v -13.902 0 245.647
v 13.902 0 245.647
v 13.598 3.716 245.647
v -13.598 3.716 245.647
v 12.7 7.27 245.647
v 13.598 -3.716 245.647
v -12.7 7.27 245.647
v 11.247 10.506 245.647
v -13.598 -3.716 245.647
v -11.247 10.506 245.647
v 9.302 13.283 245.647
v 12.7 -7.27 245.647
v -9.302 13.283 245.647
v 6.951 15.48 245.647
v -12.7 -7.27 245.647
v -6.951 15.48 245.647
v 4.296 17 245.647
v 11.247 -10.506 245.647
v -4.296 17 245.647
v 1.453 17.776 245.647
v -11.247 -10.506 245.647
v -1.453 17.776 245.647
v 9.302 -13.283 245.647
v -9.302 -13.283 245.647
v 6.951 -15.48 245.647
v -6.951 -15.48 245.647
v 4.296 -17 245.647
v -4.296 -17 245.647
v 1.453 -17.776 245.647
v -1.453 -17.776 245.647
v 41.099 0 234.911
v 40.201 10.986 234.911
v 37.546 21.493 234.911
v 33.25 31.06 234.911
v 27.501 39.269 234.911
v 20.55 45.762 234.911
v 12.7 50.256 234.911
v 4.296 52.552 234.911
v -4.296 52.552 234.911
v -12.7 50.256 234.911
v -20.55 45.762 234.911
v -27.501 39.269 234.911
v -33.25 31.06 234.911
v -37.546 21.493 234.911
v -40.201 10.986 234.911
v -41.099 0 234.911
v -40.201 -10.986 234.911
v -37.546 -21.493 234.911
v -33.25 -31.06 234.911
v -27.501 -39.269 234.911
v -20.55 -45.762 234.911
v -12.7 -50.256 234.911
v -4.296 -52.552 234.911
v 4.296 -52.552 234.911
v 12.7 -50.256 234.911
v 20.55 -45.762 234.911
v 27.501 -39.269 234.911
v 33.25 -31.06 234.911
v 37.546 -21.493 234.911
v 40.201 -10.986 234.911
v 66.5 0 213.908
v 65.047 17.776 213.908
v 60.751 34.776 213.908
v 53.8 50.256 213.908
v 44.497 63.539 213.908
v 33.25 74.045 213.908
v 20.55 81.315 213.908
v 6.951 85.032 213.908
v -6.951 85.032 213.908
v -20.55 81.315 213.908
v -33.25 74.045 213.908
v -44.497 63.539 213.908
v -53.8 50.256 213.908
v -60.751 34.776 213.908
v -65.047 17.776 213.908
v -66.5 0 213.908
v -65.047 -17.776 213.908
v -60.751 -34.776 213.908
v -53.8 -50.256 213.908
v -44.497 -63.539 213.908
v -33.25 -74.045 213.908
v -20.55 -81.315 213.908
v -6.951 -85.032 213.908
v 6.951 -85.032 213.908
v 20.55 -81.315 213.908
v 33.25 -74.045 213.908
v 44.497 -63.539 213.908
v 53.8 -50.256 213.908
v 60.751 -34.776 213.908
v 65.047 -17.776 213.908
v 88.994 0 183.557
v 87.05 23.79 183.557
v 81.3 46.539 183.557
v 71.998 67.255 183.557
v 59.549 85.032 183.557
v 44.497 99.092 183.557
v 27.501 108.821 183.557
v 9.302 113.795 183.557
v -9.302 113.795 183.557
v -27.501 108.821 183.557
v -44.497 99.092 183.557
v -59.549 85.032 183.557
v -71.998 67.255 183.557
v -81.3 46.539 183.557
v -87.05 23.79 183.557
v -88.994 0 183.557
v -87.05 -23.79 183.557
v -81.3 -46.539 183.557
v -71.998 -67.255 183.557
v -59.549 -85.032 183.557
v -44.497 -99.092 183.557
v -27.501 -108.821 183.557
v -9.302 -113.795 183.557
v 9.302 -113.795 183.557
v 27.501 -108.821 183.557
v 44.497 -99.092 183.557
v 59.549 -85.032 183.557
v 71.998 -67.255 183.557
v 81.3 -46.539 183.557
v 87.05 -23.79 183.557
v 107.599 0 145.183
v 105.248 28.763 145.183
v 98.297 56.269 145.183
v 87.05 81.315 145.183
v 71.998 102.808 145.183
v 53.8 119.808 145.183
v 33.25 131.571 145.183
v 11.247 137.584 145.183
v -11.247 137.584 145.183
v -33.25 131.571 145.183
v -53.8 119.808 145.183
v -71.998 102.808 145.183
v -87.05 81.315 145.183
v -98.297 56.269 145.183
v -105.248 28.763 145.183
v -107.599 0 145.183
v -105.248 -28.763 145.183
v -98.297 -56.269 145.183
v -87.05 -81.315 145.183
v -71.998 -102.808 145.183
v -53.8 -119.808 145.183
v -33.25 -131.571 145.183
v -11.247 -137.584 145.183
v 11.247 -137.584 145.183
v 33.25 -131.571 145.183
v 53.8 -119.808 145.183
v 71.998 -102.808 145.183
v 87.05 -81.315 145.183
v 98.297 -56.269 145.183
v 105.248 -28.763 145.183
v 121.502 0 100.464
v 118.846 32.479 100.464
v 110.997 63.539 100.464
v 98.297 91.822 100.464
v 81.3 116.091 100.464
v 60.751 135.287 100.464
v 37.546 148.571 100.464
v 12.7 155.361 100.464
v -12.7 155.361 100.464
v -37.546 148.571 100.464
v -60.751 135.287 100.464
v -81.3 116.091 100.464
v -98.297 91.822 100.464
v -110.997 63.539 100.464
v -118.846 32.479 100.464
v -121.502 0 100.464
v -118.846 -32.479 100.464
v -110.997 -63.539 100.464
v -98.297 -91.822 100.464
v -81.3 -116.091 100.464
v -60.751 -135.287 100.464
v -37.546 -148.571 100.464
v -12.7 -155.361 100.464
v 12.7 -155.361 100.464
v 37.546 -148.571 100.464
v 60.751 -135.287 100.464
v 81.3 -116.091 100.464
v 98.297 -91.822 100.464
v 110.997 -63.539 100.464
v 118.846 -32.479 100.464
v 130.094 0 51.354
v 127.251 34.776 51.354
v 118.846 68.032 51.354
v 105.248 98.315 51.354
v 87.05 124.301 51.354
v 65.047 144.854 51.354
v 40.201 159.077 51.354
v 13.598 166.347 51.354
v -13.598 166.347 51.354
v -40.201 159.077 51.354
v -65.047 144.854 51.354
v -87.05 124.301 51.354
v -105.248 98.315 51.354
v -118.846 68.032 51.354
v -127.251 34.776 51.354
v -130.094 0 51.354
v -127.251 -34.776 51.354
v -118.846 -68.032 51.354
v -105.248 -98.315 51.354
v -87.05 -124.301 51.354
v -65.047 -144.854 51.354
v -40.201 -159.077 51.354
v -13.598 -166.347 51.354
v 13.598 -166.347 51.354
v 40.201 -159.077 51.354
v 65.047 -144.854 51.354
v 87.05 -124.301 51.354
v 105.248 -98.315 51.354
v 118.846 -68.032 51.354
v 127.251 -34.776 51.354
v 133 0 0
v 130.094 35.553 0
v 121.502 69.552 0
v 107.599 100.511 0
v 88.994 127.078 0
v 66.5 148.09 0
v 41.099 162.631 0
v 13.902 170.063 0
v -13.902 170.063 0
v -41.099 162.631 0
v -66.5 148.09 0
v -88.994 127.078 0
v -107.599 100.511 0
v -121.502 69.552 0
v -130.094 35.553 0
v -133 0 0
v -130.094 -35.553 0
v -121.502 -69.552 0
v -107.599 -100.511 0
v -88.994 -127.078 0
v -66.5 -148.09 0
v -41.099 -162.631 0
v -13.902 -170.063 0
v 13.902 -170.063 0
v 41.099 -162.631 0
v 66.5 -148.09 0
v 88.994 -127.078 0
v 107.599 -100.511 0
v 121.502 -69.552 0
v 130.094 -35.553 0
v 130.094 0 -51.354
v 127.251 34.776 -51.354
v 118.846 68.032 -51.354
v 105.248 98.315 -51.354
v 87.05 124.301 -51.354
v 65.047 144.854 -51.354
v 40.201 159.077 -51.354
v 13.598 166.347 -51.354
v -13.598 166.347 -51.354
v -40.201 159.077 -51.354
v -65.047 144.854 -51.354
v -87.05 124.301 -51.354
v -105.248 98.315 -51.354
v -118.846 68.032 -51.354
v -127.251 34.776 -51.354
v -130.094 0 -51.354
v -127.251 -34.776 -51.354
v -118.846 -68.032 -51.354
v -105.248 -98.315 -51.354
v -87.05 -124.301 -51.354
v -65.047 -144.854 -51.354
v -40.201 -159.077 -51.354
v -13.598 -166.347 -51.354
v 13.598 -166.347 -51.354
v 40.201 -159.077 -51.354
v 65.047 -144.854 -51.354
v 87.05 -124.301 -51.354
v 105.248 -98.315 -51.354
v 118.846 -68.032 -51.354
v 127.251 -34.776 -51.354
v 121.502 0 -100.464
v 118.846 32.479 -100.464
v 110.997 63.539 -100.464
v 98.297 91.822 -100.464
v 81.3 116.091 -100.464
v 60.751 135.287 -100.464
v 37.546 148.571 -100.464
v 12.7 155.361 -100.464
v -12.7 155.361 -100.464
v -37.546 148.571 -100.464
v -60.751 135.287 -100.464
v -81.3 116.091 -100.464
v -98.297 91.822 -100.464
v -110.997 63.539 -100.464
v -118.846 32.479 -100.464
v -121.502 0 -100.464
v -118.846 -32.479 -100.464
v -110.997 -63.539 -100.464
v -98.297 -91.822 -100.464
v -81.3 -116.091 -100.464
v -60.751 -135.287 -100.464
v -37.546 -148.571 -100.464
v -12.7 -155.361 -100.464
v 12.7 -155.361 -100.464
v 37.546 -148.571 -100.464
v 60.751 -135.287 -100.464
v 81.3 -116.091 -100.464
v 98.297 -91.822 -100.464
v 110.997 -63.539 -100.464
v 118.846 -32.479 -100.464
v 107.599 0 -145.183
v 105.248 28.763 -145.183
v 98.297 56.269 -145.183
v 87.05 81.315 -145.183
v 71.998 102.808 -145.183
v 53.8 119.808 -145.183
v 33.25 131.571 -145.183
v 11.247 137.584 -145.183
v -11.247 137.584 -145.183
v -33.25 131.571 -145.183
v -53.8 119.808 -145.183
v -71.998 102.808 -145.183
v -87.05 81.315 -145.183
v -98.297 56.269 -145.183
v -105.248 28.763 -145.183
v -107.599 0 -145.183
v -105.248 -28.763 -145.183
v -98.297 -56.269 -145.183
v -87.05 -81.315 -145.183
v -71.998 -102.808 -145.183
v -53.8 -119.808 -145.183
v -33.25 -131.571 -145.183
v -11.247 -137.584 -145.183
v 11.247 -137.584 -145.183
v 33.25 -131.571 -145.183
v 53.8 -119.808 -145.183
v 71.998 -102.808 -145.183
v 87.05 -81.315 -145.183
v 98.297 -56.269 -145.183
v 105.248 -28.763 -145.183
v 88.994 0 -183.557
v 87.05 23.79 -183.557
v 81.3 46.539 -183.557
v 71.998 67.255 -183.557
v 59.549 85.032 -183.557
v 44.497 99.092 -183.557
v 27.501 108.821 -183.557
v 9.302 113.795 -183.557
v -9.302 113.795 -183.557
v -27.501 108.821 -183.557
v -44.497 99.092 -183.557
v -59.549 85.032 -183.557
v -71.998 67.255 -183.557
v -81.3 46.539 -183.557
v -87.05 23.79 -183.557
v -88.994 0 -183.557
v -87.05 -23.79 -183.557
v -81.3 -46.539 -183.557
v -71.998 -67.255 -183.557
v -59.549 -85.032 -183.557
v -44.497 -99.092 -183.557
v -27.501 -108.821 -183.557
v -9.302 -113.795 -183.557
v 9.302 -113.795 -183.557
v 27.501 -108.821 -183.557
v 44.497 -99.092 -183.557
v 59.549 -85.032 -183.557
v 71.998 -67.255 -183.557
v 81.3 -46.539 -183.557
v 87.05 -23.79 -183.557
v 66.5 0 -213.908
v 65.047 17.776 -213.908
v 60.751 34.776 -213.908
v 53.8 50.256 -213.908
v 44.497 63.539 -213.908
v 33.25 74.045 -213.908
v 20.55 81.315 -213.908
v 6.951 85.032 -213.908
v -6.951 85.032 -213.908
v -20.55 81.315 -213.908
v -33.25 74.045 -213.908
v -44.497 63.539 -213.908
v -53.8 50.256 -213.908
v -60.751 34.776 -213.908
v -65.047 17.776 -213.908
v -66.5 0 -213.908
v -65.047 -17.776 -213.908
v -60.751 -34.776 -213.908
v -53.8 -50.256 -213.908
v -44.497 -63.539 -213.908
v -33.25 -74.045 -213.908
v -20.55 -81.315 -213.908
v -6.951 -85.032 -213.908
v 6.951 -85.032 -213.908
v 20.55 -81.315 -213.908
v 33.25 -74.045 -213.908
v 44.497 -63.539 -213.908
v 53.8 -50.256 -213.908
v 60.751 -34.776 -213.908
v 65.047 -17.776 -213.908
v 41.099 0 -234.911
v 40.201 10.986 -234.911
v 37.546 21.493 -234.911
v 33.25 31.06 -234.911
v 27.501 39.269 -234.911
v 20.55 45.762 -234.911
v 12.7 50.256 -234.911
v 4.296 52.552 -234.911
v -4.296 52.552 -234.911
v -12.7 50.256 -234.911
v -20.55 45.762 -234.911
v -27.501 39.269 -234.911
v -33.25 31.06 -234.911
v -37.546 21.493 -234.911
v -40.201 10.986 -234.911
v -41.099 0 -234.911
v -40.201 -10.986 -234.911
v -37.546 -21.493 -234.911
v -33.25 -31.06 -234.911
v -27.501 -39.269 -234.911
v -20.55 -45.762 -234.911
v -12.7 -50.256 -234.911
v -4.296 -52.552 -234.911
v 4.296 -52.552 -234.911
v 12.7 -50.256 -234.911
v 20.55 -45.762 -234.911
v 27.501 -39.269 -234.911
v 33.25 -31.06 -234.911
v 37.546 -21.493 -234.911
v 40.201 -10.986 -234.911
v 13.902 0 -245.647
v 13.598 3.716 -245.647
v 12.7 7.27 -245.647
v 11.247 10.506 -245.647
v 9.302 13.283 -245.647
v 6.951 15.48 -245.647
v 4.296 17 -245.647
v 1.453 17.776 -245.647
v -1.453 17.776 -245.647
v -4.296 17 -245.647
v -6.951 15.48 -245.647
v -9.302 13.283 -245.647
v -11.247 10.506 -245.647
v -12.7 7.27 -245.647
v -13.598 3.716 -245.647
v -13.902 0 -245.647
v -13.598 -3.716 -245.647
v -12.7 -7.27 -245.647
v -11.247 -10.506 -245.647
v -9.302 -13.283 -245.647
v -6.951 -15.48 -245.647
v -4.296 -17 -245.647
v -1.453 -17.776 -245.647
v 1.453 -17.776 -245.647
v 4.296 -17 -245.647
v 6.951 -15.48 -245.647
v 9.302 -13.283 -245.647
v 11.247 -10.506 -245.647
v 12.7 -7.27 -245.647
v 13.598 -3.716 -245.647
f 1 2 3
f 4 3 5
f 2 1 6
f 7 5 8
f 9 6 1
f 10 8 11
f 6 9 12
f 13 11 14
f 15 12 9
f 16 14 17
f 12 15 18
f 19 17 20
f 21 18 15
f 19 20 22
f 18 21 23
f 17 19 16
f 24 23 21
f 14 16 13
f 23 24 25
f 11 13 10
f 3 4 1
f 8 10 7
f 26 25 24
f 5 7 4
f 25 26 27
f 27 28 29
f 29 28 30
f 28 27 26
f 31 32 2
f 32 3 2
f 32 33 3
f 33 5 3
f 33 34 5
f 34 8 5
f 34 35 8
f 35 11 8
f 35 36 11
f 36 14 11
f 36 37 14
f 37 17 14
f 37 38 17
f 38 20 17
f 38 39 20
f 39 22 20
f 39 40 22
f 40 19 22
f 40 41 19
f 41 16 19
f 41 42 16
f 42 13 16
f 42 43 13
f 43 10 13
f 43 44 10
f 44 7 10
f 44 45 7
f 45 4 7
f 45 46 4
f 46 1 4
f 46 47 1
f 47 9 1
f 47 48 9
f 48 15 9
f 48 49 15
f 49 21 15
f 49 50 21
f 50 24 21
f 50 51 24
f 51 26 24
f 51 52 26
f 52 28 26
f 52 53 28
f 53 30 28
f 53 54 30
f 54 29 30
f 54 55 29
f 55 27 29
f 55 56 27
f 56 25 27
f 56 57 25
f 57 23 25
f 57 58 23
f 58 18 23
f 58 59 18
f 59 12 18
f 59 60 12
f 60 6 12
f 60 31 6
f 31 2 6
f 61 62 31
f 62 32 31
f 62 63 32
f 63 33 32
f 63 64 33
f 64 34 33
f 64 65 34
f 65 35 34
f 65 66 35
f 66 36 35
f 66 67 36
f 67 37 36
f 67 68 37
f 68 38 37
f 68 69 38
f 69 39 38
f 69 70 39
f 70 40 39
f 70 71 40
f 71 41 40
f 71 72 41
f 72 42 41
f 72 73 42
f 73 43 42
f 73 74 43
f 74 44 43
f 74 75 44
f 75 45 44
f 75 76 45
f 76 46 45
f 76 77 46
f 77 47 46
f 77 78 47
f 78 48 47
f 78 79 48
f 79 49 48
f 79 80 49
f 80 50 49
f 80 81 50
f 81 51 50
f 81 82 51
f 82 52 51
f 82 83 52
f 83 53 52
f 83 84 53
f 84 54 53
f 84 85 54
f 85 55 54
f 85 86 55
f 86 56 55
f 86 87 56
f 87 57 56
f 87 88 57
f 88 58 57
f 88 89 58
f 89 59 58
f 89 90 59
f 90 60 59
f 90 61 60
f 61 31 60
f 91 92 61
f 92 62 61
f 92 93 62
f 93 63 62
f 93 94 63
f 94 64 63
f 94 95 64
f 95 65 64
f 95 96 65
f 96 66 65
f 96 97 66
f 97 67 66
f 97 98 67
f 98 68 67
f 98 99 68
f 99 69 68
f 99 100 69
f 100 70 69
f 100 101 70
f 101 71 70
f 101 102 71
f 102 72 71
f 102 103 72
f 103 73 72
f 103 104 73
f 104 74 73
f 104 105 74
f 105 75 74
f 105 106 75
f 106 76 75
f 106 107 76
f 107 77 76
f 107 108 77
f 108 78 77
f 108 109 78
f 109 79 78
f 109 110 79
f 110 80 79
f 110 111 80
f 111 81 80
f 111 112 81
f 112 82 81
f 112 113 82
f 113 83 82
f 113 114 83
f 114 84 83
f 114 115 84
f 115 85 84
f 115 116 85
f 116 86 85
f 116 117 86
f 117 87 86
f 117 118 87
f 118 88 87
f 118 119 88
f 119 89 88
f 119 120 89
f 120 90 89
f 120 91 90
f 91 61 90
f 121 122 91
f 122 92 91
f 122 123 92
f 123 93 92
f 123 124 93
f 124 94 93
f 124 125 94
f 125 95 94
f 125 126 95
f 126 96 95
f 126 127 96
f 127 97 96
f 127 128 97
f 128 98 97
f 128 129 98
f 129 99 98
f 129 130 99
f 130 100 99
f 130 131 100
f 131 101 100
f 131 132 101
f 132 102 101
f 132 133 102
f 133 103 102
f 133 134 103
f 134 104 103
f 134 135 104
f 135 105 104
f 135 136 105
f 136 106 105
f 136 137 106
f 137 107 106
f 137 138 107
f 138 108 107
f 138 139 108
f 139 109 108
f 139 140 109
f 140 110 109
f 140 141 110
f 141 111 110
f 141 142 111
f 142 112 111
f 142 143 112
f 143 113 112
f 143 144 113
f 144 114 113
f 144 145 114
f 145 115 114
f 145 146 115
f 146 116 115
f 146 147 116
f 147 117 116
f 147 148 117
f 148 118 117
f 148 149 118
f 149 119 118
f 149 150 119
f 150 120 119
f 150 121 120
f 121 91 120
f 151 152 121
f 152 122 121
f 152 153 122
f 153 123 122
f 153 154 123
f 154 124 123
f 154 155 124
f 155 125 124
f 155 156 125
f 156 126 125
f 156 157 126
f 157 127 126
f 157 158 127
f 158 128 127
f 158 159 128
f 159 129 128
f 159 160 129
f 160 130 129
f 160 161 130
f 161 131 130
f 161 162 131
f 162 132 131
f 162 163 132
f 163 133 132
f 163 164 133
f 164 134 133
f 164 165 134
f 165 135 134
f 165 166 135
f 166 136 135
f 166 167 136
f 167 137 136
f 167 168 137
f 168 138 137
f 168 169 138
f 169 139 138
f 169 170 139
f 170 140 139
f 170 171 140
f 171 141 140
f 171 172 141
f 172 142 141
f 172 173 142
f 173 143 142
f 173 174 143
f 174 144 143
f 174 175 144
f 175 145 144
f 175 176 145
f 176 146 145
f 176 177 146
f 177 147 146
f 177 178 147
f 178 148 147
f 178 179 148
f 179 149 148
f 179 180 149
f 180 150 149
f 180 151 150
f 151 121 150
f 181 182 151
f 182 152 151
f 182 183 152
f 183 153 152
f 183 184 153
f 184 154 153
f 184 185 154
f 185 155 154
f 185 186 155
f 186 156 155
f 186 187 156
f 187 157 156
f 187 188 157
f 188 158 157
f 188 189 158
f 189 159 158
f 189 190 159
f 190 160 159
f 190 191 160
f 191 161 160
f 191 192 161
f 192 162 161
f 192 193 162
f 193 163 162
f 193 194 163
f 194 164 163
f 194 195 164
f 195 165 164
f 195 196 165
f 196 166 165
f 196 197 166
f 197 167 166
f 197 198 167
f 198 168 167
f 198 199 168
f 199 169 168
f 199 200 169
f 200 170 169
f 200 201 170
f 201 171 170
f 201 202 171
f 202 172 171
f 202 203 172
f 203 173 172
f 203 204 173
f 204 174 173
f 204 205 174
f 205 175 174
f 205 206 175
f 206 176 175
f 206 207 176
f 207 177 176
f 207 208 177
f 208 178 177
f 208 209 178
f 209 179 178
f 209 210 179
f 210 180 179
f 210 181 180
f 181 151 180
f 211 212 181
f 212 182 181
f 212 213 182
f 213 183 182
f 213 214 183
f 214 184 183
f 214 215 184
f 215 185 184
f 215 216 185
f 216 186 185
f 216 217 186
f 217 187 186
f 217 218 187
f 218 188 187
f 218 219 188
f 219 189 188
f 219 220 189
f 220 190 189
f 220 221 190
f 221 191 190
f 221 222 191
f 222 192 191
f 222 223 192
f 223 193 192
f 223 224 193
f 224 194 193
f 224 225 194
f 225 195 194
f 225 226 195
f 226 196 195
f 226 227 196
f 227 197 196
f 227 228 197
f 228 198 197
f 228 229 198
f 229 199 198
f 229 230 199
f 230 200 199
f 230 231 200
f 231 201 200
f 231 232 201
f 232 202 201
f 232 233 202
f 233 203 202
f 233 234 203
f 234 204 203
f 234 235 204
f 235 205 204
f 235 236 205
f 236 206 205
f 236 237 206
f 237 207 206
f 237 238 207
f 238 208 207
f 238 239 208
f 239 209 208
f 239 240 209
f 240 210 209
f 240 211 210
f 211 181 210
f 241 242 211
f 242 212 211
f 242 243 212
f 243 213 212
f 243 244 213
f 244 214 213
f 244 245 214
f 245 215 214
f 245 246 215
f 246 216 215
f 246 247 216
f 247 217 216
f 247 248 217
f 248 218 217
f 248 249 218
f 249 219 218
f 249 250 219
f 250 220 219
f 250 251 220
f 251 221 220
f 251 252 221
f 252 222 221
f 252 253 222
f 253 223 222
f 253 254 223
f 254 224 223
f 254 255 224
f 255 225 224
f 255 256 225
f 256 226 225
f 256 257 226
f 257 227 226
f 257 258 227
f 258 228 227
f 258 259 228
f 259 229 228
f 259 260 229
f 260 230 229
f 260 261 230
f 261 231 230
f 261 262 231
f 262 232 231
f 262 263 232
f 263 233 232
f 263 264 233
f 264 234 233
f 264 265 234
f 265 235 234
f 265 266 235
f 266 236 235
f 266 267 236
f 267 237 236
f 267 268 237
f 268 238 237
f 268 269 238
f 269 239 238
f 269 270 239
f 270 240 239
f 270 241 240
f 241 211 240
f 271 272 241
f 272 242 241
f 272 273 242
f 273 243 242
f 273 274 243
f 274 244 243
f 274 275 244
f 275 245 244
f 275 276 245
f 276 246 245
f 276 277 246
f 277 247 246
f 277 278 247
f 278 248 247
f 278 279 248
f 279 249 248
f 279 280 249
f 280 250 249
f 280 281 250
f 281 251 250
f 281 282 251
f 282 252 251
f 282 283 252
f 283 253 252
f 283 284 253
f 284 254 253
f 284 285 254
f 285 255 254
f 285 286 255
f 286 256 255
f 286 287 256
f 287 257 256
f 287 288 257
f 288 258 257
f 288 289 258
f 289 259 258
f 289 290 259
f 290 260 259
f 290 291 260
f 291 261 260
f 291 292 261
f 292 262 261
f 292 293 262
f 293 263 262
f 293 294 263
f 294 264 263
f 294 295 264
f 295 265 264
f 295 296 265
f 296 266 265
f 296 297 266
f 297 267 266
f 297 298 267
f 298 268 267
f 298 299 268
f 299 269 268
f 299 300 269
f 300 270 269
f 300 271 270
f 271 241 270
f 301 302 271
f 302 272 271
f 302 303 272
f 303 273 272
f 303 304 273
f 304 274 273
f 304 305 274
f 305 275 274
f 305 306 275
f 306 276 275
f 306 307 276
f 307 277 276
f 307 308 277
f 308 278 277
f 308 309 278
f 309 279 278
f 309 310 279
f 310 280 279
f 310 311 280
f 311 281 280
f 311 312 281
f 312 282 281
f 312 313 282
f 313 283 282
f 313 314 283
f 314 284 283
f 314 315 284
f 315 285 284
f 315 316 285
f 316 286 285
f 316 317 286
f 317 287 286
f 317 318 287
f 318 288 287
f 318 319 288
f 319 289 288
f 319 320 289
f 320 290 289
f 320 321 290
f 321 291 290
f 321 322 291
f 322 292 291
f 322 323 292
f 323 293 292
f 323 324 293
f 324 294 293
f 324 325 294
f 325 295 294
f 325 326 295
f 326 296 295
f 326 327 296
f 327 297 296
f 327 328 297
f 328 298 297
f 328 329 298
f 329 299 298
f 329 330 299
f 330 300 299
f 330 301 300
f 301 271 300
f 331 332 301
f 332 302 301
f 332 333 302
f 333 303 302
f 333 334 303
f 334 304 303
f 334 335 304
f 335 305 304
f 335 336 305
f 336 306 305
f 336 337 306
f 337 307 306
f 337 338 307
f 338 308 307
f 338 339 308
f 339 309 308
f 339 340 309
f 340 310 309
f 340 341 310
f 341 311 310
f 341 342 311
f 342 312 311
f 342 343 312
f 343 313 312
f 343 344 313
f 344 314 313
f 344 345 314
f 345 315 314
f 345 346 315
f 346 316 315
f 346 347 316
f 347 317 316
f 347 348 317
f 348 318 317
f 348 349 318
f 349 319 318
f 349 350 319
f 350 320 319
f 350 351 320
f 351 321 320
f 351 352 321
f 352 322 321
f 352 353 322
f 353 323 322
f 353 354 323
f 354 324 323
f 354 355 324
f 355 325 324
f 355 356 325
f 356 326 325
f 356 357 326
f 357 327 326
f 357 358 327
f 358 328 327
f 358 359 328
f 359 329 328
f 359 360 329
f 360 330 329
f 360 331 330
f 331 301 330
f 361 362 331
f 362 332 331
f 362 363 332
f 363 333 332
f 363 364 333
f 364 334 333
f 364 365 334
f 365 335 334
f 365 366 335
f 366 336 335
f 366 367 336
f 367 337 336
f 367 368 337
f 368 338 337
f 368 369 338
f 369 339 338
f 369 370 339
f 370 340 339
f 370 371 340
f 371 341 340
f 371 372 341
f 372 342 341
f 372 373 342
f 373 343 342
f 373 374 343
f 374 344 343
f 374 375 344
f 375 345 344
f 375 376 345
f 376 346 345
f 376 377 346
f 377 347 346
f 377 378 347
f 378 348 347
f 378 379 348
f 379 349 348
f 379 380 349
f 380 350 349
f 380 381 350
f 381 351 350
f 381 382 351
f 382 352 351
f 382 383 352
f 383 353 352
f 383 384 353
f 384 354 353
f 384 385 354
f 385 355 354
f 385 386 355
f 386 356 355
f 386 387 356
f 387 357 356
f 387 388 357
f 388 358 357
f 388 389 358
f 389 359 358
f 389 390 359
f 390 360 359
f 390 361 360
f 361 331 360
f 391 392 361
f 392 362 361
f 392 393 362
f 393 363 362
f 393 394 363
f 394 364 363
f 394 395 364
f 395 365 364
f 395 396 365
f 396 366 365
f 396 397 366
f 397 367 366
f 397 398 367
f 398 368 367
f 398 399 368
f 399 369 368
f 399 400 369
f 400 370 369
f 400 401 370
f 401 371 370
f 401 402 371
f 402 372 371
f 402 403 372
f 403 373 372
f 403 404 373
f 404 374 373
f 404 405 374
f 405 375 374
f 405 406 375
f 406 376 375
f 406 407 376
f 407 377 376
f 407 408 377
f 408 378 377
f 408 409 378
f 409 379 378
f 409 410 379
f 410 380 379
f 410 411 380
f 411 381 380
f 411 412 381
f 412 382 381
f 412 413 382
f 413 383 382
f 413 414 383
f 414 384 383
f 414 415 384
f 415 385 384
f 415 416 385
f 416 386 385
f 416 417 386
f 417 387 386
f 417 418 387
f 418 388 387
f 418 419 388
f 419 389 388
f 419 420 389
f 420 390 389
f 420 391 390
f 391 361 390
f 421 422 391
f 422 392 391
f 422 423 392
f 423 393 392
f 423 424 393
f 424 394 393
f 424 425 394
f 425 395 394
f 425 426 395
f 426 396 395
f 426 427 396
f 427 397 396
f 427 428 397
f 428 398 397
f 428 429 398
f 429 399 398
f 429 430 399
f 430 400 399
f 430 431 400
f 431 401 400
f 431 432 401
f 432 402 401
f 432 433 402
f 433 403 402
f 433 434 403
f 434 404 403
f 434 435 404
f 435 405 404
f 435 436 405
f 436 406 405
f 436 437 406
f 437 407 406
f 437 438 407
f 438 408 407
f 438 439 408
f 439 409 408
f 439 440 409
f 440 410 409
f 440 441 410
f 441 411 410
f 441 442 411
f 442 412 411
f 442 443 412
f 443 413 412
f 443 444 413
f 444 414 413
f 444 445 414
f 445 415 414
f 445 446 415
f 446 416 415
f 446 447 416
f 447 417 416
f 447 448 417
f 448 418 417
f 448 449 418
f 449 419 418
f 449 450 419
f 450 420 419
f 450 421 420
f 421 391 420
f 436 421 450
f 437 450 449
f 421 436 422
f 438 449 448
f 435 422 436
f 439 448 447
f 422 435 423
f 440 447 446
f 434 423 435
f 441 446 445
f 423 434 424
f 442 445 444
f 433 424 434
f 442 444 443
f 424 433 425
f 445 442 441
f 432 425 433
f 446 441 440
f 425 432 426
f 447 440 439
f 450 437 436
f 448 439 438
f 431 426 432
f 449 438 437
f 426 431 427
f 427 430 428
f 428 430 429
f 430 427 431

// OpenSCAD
// Generated by SolidPython 1.0.1 on 2020-07-29 00:46:47


scale(v = [7, 9, 13]) {
	sphere(r = 19);
}
/***********************************************
*********      SolidPython code:      **********
************************************************
 
# import packages: SolidPython
from solid import *
from solid.utils import *
from itertools import chain, combinations, permutations


class Resize:

    def __init__(self, scad_file):
        self.scad_file = scad_file
        #self.scad_file = import_scad(scad_file)
        # cone/cylinder param:
        self.r1 = 0
        self.r2 = 0
        self.h = 0
        # rectangular prism param:
        self.w = 0
        self.l = 0
        # ellipse param:
        self.r = 0

    # import OpenScad code (file name corresponds to shape)


    # classify shape + parameters
    def assign(self, param1, param2, param3):
        if self.scad_file == 'cone.scad':
            self.r1 = param1
            self.r2 = param2
            self.h = param3
        elif self.scad_file == 'cylinder.scad':
            self.r1 = param1
            self.r2 = param2
            self.h = param3
        elif self.scad_file == 'rectangularPrism.scad':
            self.h = param1
            self.l = param2
            self.w = param3
        else:
            self.r = param1
            self.h = param2

    # resize parameters
    def iterate(self):
        x = range(3, 20, 2)
        i = 1
        if self.scad_file == 'cone.scad':
            tempList = list(permutations(x, 2))
            for temp in tempList:
                param1 = temp[0]
                param2 = temp[1]
                filepath = 'produced_scad_files/' + 'cone' + str(param1) + '_' + str(param2) + '_' + '.scad'
                scad_render_to_file(cylinder(h=param1, r1=param2, r2=0), filepath)

        elif self.scad_file == 'cylinder.scad':
            tempList = list(permutations(x, 3))
            for temp in tempList:
                param1 = temp[0]
                param2 = temp[1]
                filepath = 'produced_scad_files/' + 'cylinder' + str(param1) + '_' + str(param2) + '_' + '.scad'
                scad_render_to_file(cylinder(h=param1, r1=param2, r2=param2), filepath)

        elif self.scad_file == 'rectangularPrism.scad':
            tempList = list(permutations(x, 3))
            for temp in tempList:
                param1 = temp[0]
                param2 = temp[1]
                param3 = temp[2]
                filepath = 'produced_scad_files/' + 'rectangularPrism' + str(param1) + '_' + str(param2) + '_' + str(
                    param3) + '.scad'
                scad_render_to_file(cube(size=(param1, param2, param3)), filepath)

        elif self.scad_file == 'ellipse.scad':
            tempList = list(permutations(x, 4))
            for temp in tempList:
                param1 = temp[0]
                param2 = temp[1]
                param3 = temp[2]
                param4 = temp[3]
                filepath = 'produced_scad_files/' + 'ellipse' + str(param1) + '_' + str(param2) + '_' + str(param3) + '_' + str(param4) + '.scad'
                scad_render_to_file(scale([param1, param2, param3])(sphere(r=param4)), filepath)

    def render_to_scadfile(self):
        scad_render_to_file(scad, 'example.scad') 
 
************************************************/
